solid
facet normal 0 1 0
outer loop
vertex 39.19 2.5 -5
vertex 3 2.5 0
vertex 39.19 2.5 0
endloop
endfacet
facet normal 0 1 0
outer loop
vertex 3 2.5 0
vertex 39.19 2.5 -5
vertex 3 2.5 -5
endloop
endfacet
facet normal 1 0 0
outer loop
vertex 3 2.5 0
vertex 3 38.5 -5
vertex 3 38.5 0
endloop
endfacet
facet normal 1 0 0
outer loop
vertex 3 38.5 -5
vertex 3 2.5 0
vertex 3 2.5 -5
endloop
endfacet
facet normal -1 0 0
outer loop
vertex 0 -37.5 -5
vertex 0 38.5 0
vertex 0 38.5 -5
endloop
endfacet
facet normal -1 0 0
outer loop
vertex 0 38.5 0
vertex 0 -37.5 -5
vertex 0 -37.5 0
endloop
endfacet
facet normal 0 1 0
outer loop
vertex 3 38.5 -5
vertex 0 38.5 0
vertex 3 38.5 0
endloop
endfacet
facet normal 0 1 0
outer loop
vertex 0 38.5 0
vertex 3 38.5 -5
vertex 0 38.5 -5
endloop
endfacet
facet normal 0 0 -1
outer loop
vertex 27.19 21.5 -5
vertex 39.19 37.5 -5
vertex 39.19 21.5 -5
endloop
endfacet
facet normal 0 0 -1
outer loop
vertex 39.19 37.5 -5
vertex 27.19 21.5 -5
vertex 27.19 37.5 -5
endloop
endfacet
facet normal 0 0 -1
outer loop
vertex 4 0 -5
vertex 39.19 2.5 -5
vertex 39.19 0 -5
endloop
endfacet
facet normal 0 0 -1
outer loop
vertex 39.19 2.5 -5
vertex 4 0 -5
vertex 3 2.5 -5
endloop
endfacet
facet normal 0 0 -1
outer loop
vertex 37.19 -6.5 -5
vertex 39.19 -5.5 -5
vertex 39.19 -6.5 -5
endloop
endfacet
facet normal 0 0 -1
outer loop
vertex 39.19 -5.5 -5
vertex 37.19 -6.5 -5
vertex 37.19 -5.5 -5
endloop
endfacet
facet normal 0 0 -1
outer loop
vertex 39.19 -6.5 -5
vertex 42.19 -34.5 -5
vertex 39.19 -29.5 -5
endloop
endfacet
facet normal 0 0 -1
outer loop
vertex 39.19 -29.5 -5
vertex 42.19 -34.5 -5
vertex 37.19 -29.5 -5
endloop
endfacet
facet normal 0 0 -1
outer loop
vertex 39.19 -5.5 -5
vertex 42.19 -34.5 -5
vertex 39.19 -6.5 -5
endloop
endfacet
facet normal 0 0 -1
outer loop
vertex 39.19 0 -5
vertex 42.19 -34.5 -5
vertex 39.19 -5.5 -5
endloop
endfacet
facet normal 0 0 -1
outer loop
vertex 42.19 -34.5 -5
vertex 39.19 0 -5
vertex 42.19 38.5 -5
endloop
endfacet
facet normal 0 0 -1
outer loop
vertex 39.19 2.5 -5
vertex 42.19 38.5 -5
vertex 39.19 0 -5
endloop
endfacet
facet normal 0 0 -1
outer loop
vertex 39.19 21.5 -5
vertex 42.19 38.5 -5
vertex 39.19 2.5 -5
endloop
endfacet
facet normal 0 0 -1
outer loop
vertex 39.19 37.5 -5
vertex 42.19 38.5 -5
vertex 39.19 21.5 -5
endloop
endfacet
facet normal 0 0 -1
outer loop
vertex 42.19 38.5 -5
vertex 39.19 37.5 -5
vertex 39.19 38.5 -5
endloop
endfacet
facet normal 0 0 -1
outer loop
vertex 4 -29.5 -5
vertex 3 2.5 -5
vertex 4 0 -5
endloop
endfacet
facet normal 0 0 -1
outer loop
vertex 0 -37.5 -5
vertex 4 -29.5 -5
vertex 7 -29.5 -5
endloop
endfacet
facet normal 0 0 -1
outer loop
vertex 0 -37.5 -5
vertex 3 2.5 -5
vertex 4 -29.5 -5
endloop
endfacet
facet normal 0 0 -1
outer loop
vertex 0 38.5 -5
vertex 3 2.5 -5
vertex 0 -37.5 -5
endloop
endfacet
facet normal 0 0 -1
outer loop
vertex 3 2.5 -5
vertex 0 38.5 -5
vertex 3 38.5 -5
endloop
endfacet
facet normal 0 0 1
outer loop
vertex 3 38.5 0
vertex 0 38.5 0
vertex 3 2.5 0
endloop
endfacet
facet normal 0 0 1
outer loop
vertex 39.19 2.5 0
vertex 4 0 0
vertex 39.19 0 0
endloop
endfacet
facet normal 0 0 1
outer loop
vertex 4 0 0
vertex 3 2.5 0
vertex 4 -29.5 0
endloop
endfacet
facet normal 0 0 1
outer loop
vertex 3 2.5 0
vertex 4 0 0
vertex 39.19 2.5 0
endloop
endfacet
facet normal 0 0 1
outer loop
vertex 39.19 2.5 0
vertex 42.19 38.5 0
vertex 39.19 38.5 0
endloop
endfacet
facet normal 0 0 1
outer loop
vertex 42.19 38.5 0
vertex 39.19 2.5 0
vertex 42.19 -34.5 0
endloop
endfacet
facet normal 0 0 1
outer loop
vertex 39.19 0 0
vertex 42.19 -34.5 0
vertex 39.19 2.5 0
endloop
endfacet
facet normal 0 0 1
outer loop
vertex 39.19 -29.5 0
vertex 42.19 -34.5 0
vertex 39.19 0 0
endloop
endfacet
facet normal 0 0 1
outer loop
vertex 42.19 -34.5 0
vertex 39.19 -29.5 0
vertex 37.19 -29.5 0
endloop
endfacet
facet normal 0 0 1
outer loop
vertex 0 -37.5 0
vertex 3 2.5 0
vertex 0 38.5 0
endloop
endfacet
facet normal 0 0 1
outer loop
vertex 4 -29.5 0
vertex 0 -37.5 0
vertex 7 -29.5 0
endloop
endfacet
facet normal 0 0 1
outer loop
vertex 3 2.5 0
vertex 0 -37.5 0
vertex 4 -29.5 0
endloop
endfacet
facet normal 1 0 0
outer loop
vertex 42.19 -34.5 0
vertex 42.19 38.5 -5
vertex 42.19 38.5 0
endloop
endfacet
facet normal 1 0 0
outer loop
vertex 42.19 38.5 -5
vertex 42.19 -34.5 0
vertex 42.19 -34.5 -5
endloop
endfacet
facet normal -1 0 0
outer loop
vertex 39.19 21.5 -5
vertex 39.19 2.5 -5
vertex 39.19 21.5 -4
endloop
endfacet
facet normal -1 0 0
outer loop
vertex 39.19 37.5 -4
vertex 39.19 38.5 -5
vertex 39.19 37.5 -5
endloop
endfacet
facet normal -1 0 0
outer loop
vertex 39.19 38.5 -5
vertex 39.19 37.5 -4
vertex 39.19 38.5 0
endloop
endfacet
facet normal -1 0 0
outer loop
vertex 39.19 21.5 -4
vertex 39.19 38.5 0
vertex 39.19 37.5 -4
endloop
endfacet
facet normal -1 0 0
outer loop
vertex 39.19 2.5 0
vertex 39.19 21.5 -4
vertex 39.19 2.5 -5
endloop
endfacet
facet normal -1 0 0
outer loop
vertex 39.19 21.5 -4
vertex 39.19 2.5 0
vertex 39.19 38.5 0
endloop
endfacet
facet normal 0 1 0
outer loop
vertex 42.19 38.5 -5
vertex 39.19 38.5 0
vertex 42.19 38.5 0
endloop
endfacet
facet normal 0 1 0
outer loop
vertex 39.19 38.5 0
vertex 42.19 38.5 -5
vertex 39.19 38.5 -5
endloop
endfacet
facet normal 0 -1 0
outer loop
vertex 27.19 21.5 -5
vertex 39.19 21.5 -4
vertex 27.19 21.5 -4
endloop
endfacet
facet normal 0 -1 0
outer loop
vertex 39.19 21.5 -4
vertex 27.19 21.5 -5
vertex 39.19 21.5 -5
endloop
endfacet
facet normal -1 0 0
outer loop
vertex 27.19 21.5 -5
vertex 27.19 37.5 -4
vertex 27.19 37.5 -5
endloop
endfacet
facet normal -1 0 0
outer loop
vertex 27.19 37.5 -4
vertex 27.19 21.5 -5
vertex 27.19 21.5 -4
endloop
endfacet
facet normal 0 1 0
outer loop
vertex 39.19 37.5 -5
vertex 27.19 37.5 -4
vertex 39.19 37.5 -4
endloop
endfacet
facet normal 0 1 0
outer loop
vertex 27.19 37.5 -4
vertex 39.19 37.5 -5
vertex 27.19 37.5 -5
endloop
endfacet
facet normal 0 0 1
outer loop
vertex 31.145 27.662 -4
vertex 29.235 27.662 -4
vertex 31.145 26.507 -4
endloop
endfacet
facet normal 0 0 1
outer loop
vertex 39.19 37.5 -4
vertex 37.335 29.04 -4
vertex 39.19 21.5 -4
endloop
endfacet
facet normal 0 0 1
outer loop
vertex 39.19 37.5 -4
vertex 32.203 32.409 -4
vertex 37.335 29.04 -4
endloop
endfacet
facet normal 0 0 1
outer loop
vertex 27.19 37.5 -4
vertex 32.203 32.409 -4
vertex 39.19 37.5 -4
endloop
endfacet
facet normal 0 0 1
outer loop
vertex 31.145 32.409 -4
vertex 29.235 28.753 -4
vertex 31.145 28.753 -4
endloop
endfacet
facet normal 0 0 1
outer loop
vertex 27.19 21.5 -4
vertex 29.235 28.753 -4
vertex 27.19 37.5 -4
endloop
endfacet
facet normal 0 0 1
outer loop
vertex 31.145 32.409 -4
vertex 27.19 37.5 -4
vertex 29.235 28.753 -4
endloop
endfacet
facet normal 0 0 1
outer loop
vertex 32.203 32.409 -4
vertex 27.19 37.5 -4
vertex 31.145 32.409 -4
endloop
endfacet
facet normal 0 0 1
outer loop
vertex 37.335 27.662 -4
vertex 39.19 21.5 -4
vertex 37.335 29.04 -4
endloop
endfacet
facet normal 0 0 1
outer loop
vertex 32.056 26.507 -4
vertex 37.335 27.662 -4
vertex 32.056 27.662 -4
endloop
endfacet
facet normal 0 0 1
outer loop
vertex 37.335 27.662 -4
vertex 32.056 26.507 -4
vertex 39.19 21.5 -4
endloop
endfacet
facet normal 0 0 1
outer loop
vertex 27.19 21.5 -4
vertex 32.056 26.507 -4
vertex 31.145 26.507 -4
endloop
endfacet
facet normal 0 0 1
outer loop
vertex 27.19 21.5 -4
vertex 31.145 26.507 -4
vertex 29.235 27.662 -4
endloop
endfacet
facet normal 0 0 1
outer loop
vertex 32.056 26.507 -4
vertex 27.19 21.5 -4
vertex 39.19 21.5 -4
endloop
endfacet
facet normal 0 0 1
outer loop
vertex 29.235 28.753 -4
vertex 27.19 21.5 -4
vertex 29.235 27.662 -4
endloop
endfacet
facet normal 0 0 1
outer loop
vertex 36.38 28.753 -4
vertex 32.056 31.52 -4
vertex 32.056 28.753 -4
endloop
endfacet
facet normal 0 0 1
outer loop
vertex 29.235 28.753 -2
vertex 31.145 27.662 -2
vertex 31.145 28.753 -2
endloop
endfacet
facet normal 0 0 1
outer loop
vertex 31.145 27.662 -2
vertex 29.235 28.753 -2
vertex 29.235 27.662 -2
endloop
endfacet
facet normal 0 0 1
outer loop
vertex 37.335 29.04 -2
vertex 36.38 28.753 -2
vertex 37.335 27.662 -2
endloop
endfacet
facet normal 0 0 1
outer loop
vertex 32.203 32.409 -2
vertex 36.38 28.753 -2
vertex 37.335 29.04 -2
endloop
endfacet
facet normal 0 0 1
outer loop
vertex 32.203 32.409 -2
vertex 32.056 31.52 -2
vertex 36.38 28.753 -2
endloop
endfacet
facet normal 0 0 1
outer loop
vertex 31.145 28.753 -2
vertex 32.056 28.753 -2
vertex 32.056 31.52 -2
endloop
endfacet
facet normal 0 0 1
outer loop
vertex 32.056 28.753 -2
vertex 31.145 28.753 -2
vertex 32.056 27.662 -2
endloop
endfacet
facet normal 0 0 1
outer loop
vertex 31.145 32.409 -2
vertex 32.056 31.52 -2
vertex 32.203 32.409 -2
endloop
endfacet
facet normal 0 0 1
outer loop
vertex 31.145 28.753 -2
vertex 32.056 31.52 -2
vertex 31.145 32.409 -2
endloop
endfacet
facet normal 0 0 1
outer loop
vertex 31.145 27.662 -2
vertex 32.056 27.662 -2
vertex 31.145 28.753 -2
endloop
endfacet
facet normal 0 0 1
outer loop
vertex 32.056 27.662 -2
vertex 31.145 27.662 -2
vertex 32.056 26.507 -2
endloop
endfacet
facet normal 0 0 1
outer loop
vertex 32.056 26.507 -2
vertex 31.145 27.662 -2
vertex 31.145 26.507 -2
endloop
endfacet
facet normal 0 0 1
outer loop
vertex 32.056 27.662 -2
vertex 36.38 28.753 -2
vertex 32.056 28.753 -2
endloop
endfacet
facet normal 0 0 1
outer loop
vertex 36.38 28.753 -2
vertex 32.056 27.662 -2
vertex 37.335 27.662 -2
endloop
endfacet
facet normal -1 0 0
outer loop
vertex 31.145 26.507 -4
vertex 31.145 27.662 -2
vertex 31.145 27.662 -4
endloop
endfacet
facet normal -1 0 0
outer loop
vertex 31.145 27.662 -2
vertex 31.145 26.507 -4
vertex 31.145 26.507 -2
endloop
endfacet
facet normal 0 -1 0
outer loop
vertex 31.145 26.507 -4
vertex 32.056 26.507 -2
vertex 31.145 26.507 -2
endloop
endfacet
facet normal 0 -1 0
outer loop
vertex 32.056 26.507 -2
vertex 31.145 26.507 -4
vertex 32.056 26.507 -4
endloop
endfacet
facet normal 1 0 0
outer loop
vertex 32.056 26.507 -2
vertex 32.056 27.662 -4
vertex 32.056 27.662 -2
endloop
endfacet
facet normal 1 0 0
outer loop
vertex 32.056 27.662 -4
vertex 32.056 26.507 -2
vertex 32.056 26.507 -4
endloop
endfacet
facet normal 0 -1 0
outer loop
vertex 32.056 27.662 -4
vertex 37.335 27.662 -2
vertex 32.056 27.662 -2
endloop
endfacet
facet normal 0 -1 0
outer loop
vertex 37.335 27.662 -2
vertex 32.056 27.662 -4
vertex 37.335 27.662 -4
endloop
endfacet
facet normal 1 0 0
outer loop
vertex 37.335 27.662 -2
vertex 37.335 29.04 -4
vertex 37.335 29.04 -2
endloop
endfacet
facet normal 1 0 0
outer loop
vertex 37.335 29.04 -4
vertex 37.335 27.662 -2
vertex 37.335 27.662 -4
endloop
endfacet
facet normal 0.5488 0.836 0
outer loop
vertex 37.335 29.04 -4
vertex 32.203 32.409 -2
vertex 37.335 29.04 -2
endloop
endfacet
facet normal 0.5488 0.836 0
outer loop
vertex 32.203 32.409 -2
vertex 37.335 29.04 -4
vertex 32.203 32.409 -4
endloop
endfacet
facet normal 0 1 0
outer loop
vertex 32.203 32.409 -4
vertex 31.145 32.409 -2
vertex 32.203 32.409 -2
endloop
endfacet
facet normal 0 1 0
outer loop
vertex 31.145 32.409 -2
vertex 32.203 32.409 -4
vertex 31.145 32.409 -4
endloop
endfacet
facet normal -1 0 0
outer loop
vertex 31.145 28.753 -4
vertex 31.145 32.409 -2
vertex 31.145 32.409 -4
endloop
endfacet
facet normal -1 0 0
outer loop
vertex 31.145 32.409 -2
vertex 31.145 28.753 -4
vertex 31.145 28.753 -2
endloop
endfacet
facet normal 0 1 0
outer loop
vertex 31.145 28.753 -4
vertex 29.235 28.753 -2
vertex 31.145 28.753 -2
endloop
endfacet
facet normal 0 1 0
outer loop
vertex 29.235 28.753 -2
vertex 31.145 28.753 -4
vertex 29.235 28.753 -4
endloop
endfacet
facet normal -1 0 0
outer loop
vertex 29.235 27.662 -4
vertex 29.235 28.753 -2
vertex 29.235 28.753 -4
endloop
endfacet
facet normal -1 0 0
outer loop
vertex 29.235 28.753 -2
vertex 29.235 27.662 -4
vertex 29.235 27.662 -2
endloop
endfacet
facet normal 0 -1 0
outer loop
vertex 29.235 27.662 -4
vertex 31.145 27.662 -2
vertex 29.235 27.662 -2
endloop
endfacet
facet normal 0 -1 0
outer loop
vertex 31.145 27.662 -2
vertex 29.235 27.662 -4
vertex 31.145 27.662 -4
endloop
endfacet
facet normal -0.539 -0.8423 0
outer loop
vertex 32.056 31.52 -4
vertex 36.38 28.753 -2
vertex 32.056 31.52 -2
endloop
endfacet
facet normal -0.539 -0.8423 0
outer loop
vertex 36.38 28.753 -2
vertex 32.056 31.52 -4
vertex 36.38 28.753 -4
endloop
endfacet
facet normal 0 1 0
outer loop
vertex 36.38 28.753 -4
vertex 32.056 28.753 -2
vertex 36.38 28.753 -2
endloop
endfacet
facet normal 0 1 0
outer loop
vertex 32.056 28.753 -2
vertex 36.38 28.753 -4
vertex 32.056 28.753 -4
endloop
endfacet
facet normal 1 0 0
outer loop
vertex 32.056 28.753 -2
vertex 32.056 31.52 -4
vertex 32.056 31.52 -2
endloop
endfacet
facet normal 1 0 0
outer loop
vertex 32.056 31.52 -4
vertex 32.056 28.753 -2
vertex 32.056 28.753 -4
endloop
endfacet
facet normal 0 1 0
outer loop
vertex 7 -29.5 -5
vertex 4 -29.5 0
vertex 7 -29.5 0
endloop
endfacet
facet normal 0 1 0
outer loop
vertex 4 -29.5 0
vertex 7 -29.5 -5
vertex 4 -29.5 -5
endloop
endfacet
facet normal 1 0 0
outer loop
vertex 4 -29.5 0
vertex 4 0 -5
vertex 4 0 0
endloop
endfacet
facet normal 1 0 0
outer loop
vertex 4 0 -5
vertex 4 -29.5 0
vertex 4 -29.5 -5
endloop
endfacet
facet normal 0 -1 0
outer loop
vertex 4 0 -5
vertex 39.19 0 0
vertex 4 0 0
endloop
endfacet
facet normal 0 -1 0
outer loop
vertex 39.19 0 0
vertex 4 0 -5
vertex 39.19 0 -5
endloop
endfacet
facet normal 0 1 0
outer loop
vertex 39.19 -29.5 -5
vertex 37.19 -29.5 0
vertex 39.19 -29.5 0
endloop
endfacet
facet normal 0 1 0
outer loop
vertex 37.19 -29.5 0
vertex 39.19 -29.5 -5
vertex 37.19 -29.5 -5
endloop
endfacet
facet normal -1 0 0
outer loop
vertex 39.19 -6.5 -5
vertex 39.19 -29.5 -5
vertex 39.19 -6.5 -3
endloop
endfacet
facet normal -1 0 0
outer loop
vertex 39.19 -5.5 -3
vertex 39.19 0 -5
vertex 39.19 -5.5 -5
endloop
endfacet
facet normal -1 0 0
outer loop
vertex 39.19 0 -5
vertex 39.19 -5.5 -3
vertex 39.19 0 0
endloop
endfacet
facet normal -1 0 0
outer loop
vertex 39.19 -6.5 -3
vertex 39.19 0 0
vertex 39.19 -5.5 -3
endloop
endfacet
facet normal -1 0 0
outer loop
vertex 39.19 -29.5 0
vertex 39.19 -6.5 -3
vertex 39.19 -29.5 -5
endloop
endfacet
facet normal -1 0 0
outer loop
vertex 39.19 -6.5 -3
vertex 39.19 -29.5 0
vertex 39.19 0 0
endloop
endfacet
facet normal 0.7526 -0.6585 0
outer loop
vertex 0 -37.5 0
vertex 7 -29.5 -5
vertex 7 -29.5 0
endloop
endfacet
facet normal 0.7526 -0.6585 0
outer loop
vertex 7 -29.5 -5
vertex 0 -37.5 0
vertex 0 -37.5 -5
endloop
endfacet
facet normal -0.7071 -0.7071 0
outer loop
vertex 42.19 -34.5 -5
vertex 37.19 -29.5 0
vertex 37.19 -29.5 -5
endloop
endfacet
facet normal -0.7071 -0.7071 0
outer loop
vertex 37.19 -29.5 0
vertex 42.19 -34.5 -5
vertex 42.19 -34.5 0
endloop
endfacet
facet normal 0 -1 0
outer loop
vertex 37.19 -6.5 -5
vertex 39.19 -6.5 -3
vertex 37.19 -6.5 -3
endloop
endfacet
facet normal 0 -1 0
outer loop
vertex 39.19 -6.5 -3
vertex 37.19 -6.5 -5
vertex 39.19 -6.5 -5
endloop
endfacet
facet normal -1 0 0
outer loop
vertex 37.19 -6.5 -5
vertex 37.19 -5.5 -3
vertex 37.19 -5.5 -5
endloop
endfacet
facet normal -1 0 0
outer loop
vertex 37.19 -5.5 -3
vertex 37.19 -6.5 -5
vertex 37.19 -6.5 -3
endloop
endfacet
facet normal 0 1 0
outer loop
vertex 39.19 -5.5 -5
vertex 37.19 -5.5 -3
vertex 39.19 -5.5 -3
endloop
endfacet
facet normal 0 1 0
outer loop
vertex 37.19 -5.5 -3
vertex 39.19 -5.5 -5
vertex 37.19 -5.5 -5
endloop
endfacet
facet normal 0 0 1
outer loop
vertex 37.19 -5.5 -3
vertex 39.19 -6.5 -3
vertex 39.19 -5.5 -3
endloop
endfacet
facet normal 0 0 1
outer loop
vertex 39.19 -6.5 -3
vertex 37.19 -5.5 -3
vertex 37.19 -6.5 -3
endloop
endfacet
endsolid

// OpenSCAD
// This is, essentially, a complete re-do of this item on thingiverse:
// https://www.thingiverse.com/thing:1808029
//
// Bill Kearney, 2017
// NOT for commercial reproduction or use

// How much should the bed be raised? Use calipers to measure your glass thickness. Note: 1/8" = 3.175mm, 3/8" = 9.525mm
ADDED_BED_HEIGHT = 4; // [0.8, 1, 2, 3, 3.125, 3.175, 4, 5, 6, 9.525]

// How wide you want the spacer to be?  7mm is about the max.
SPACER_WIDTH = 5; // [5,6,7]

// How deep should the top hook be? 
TOP_HOOK_DEPTH = 2.0; // [2.0, 3.0, 4.0]
// How deep should the bottom hook be? 
BOTTOM_HOOK_DEPTH = 3.0; // [2.0, 3.0, 4.0]

// How far forward should the top hook extend? 
TOP_HOOK_LENGTH = 5.0; // [3.0, 4.0, 5.0]
// How far forward should the bottom hook extend? 
BOTTOM_HOOK_LENGTH = 8.0; // [5.0, 6.0, 7.0, 8.0]

// Add insertion levers on the back?  These let you insert and remove from the machine without taking it apart.
INCLUDE_LEVERS = 1; // [0,1]
// How far back should the levers extend? 
LEVER_LENGTH = 36;

// Add a flag showing the added height?  1=Show the size flag 0=Leave it off
INCLUDE_FLAG = 1; // [0,1]  

// Add a small pin to help hold the bracket in place?  1=Add a pin 0=No pin
INCLUDE_CATCH = 1; // [0,1]  
// Distance from back of gantry to indent for catch pin
CATCH_GAP = 5.5;
// Size of catch
CATCH_THICKNESS = 1;
// Width of catch
CATCH_WIDTH = 2;
// Depth of catch
CATCH_HEIGHT = 2;

// Vertical size of gantry bracket
GANTRY_HEIGHT = 35.19;
// Horizontal (front-back) size of gantry bracket
GANTRY_DEPTH = 29.5;

// Thickness of bottom lever
BOTTOM_THICKNESS = 3;
// Thickness of top lever
TOP_THICKNESS = 3;
// Thickness of upright post
UPRIGHT_THICKNESS = 2.5;

// How tall to make the added bed height number
FLAG_CHARACTER_SIZE = 8;  
// How far to make the number stand out from the flag
FLAG_EXTRUSION = 3;
// How tall to make the flag
FLAG_HEIGHT = 12; 
// How thick to make the flag
FLAG_THICKNESS = 1; 

// What font to use for the number?
FONT_NAME="Basic Sans Serif 7:style=Regular"; // ["Arial:style=Black","Arial:style=Narrow Bold","Basic Sans Serif 7:style=Regular","Candara","Chewy","Comic Sans MS","Liberation Sans"

//FONT_NAME="Arial:style=Black";
//FONT_NAME="Arial:style=Narrow Bold";
//FONT_NAME="Comic Sans MS";
//FONT_NAME="Liberation Sans";

module letter(l,s,x) {  // raised lettering 
    rotate([90,0,0])
    linear_extrude(height = x) {
        text(l, size = s, halign = "center", font = FONT_NAME, valign = "center", $fn = 32);
    }
}

module prism(l, w, h){  // tips on ends of brackets
       polyhedron(
               points=[[0,0,0], [l,0,0], [l,w,0], [0,w,0], [0,w,h], [l,w,h]],
               faces=[[0,1,2,3],[5,4,3,2],[0,4,5,1],[0,3,4],[5,2,1]]
               );
}

module make_bracket() {  // main routine to create the bracket
    rotate([-90,0,-90]){  // turned over onto the side to facilitate importing for 3D printing
        translate([0,0,0])
        cube([GANTRY_DEPTH,SPACER_WIDTH,ADDED_BED_HEIGHT], center=false);
        
        translate([-UPRIGHT_THICKNESS,0,0])
        cube([UPRIGHT_THICKNESS,SPACER_WIDTH,ADDED_BED_HEIGHT+GANTRY_HEIGHT+TOP_THICKNESS], center=false);
        
        translate([0,0,ADDED_BED_HEIGHT+GANTRY_HEIGHT])
        cube([GANTRY_DEPTH,SPACER_WIDTH,TOP_THICKNESS], center=false);

        // bottom hook
        translate([GANTRY_DEPTH+BOTTOM_HOOK_LENGTH,0,0])
        rotate([0,0,90])
        prism(SPACER_WIDTH,BOTTOM_HOOK_LENGTH,ADDED_BED_HEIGHT+BOTTOM_HOOK_DEPTH);
        
        // top hook
        translate([GANTRY_DEPTH+TOP_HOOK_LENGTH,SPACER_WIDTH,ADDED_BED_HEIGHT+GANTRY_HEIGHT+TOP_THICKNESS])
        rotate([0,180,90])
        prism(SPACER_WIDTH,TOP_HOOK_LENGTH,TOP_THICKNESS+TOP_HOOK_DEPTH);
        
        // I should note that my son, Will, got to file his first-ever bug report.
        // He asked me to try all kinds of crazy numbers for the various pieces.
        // During that process it was revealed I was using the wrong variable to calculate the top hook.
        // SQA to the rescue!
        
        if (INCLUDE_LEVERS){
            translate([-LEVER_LENGTH-UPRIGHT_THICKNESS,0,0])
            cube([LEVER_LENGTH,SPACER_WIDTH,BOTTOM_THICKNESS], center=false);

            translate([-LEVER_LENGTH-UPRIGHT_THICKNESS,0,ADDED_BED_HEIGHT+GANTRY_HEIGHT])
            cube([LEVER_LENGTH,SPACER_WIDTH,TOP_THICKNESS], center=false);
        }
        
        if (INCLUDE_FLAG){
            if (INCLUDE_LEVERS) {
                HEIGHT_LEN = len(str(ADDED_BED_HEIGHT));
                
                // so what is this clever bit of ? logic?  
                FLAG_WIDTH = HEIGHT_LEN > 1 ? FLAG_CHARACTER_SIZE * HEIGHT_LEN : FLAG_CHARACTER_SIZE * 2;
                // It's to work around openSCAD way of handling variable scopes
                // can't use an if{} scope because any changes would only work inside that scope
                // this way the FLAG_WIDTH can be changed on the fly
                                
                translate([-LEVER_LENGTH-UPRIGHT_THICKNESS+1,SPACER_WIDTH-FLAG_THICKNESS,ADDED_BED_HEIGHT+GANTRY_HEIGHT-FLAG_HEIGHT])
                difference() {
                    union() {
                        cube(size=[FLAG_WIDTH,FLAG_THICKNESS,FLAG_HEIGHT], center = false);
                        translate([FLAG_WIDTH/2,FLAG_THICKNESS,FLAG_HEIGHT/2]) letter(str(ADDED_BED_HEIGHT),FLAG_CHARACTER_SIZE,FLAG_EXTRUSION);
                    }
                }
                
            // I should probably refactor the flag code here into a function... some day...
            
            } else {
                HEIGHT_LEN = len(str(ADDED_BED_HEIGHT));
                
                FLAG_WIDTH = HEIGHT_LEN > 1 ? FLAG_CHARACTER_SIZE * HEIGHT_LEN : FLAG_CHARACTER_SIZE * 2;
                translate([-FLAG_HEIGHT-UPRIGHT_THICKNESS,SPACER_WIDTH-FLAG_THICKNESS,((ADDED_BED_HEIGHT+GANTRY_HEIGHT+TOP_THICKNESS)/2+(FLAG_WIDTH/2))])
                rotate([0,90,0])  //turn it to fit closer to the upright
                difference() {
                    union() {
                        cube(size=[FLAG_WIDTH,FLAG_THICKNESS,FLAG_HEIGHT], center = false);
                        translate([FLAG_WIDTH/2,FLAG_THICKNESS,FLAG_HEIGHT/2]) letter(str(ADDED_BED_HEIGHT),FLAG_CHARACTER_SIZE,FLAG_EXTRUSION);
                    }
                }
                
            }
        }
        if (INCLUDE_CATCH){
            translate([CATCH_GAP,SPACER_WIDTH-CATCH_WIDTH,ADDED_BED_HEIGHT+GANTRY_HEIGHT-CATCH_HEIGHT])
            cube(size=[CATCH_THICKNESS,CATCH_WIDTH,CATCH_HEIGHT], center = false);
        }
    }  // end of rotate{} scope to orient toward the bed for 3D printing
}

make_bracket();
